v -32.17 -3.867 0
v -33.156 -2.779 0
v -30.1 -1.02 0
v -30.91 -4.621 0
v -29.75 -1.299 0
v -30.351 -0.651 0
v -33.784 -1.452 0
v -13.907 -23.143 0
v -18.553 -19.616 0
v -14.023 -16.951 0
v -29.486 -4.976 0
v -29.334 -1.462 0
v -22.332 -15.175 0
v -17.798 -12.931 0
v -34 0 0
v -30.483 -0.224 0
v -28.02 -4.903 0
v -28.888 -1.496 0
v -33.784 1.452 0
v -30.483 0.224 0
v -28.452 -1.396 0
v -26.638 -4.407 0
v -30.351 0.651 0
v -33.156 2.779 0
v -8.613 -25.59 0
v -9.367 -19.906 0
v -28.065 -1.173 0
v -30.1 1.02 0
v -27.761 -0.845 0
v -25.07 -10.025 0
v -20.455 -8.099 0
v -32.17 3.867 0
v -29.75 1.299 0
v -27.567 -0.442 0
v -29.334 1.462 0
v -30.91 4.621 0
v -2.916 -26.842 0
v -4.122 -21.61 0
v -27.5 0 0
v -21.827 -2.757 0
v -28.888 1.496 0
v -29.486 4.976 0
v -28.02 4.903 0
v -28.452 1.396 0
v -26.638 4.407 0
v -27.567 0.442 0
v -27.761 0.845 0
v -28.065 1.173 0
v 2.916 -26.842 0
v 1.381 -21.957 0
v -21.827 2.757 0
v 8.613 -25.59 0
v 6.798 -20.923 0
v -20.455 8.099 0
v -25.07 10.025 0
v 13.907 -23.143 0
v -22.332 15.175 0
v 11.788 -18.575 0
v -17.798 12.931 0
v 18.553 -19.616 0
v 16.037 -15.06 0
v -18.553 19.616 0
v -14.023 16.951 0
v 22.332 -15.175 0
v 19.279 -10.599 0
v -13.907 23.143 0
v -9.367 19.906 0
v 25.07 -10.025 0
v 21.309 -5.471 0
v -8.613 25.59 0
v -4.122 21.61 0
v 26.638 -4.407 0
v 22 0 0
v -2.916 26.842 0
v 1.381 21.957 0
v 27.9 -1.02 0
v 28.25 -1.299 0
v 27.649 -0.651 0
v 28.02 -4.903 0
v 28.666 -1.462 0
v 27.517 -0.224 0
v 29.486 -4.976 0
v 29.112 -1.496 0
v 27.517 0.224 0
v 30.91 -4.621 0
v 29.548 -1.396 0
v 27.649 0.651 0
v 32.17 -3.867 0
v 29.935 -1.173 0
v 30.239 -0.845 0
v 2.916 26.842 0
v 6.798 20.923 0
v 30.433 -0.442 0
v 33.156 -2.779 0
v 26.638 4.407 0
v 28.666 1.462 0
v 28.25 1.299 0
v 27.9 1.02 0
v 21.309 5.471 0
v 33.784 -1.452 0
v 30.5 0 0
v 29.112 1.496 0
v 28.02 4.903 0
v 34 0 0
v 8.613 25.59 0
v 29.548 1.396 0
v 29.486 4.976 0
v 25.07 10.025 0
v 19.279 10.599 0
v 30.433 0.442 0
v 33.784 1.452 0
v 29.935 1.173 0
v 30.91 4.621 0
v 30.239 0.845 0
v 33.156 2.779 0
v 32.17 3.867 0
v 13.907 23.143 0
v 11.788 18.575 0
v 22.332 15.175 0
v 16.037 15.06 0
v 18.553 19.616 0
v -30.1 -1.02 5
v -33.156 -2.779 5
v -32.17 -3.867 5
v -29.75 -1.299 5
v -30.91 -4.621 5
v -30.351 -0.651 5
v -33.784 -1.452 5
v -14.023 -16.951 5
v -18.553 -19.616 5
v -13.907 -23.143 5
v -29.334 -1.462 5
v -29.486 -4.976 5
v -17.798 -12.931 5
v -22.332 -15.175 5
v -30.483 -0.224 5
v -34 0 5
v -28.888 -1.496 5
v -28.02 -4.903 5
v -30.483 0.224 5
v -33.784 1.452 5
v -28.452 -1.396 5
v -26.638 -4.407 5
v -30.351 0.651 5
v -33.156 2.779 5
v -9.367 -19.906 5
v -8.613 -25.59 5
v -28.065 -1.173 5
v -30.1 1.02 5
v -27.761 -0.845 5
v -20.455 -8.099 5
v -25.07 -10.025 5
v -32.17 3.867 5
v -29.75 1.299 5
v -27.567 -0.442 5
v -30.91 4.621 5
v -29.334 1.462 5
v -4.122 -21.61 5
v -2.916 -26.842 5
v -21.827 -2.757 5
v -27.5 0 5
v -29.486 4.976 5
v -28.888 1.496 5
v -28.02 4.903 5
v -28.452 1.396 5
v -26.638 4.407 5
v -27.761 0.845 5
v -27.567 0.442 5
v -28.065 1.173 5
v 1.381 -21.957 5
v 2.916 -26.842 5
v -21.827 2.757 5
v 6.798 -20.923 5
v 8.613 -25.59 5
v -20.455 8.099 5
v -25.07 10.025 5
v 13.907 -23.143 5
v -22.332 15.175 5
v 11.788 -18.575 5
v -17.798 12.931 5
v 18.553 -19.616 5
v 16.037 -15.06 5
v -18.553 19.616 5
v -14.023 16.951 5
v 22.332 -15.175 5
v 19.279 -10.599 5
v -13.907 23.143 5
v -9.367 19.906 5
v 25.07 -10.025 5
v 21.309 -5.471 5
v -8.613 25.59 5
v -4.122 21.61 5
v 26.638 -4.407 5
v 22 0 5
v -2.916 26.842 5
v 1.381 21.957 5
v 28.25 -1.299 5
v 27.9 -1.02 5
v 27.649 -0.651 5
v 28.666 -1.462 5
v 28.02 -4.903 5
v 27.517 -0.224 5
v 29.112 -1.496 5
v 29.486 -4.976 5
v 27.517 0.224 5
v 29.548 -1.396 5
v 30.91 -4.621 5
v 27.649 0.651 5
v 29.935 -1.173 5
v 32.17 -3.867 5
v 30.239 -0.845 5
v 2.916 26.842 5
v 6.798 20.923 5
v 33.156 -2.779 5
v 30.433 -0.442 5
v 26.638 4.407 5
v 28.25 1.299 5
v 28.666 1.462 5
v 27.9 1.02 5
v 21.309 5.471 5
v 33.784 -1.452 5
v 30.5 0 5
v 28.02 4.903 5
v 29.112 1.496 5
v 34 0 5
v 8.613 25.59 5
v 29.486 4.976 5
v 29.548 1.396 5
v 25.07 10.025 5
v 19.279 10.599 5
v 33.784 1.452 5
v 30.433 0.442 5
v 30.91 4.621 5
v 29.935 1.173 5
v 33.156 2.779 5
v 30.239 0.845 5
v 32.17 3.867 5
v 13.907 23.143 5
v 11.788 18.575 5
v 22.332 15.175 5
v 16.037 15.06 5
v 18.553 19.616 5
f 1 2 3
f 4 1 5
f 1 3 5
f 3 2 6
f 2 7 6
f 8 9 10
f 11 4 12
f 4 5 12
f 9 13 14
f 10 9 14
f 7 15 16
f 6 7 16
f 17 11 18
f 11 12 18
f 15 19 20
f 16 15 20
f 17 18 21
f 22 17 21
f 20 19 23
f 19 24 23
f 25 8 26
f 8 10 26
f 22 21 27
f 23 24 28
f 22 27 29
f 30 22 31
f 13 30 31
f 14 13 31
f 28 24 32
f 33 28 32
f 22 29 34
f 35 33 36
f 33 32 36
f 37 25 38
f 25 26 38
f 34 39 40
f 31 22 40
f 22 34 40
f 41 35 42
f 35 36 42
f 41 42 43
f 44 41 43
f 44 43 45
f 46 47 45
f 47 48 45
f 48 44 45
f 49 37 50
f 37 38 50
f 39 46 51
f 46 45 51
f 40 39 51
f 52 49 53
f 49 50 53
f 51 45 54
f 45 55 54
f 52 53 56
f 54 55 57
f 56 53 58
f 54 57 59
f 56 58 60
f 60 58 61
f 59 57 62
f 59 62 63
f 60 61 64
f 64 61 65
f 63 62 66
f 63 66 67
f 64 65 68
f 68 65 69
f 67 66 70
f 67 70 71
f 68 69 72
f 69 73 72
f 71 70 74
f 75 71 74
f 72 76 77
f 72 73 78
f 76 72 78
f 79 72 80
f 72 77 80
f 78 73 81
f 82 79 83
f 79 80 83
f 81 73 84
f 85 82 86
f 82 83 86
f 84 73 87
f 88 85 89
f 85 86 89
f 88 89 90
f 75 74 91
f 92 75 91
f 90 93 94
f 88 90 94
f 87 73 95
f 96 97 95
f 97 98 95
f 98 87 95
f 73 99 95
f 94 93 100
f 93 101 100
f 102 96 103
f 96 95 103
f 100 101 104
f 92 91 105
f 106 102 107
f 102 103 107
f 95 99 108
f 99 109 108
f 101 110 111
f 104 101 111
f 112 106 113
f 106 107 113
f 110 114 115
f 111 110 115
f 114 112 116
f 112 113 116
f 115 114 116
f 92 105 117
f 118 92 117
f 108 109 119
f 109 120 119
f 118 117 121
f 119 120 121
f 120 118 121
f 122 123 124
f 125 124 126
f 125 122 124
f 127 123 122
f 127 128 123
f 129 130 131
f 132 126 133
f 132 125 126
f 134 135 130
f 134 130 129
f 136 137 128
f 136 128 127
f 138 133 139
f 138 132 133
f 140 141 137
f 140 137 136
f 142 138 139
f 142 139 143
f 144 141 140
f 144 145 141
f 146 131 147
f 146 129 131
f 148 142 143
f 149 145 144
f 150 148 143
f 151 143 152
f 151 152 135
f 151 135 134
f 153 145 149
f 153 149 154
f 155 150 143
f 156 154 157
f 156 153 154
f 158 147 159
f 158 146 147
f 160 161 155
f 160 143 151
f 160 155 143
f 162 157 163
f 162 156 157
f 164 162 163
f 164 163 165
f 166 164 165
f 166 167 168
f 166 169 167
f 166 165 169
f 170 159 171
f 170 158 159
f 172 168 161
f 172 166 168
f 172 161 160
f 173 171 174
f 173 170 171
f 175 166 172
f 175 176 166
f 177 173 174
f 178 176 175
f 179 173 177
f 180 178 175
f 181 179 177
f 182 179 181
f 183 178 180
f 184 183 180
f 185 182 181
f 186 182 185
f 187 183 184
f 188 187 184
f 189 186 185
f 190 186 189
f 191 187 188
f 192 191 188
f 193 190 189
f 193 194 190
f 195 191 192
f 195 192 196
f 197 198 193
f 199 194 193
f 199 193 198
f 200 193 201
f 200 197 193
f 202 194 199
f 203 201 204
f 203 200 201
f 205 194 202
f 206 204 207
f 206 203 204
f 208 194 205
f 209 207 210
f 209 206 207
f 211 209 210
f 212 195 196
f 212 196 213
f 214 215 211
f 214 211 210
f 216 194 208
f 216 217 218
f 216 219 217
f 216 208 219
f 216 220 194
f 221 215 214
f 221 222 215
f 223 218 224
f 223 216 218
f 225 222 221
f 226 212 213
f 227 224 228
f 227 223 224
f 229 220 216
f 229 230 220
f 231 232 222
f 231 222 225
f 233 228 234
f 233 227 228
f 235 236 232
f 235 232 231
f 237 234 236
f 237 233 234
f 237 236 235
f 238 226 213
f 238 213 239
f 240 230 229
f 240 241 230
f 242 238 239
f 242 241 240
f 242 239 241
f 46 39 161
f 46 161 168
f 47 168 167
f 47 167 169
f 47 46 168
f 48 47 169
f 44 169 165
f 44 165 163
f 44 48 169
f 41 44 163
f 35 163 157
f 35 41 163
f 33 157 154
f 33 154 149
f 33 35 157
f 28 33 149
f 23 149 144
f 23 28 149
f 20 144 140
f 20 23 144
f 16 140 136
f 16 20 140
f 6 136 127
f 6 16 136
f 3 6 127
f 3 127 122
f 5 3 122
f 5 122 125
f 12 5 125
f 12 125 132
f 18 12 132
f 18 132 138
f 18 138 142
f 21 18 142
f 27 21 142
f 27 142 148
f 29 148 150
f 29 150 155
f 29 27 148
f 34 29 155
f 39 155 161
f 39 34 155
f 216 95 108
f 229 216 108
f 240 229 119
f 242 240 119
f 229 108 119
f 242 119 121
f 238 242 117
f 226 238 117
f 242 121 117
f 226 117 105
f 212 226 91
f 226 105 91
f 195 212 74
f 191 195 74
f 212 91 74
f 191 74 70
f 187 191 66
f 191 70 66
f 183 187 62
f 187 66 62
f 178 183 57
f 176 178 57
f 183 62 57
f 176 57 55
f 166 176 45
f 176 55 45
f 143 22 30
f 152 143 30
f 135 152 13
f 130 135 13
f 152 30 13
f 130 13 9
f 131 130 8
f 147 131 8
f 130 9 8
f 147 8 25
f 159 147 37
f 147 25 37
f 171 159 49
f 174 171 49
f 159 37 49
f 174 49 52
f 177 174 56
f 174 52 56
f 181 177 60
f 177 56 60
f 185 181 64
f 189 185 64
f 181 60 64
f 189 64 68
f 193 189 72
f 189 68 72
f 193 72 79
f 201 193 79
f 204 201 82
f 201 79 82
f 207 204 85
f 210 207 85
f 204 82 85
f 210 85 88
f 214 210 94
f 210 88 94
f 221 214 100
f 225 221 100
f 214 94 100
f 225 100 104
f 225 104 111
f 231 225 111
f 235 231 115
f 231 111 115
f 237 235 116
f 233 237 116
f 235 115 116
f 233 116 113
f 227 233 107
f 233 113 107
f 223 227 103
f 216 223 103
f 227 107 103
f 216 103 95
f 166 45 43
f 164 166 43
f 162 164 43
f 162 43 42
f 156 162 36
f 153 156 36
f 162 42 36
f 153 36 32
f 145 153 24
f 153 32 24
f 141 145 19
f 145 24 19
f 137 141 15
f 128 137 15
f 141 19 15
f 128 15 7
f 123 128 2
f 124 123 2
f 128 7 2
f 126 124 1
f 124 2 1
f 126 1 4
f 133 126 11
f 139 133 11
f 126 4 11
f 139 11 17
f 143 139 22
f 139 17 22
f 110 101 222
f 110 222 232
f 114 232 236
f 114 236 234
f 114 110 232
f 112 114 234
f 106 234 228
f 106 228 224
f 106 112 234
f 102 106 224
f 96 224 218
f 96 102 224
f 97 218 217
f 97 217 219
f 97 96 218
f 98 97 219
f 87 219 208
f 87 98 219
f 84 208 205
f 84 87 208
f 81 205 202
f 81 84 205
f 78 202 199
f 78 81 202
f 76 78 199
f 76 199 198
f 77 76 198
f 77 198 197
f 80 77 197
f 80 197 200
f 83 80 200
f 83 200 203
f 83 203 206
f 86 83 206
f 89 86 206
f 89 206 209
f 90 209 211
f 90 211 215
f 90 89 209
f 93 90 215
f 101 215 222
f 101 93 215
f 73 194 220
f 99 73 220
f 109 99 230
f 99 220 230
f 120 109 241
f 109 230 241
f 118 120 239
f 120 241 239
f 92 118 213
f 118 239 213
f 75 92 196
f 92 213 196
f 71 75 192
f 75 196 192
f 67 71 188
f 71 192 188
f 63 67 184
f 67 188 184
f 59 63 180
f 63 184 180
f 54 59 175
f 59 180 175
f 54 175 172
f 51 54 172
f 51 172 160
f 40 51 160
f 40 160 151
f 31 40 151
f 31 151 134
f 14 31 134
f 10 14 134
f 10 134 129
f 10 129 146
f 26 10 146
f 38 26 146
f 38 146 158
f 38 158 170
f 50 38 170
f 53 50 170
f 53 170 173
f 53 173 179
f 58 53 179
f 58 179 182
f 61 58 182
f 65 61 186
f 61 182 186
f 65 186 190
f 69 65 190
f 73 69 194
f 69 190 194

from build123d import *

# Parameters (mm, degrees)
F0_R     = 1.5
F1_DEPTH = 5
F2_DEPTH = 5
F3_R     = 22
F4_DEPTH = 6


with BuildPart() as f1:
    # F0 (on Top) → F1 (new body)
    with BuildSketch(Plane.XY):
        with BuildLine():
            ThreePointArc((-26.6379310345, -4.4068844099), (-27, 0), (-26.6379310345, 4.4068844099))
            ThreePointArc((-26.6379310345, 4.4068844099), (-34, 0), (-26.6379310345, -4.4068844099))
        make_face()
        with Locations((-29, 0)):
            Circle(F0_R, mode=Mode.SUBTRACT)
    extrude(amount=F1_DEPTH)



with BuildPart() as f1b:
    # F0 (on Top) → F1, piece 2 (new body)
    with BuildSketch(Plane.XY):
        with BuildLine():
            ThreePointArc((26.6379310345, 4.4068844099), (26.9093305187, 2.21086658), (27, 0))
            ThreePointArc((27, 0), (26.9093305187, -2.21086658), (26.6379310345, -4.4068844099))
            ThreePointArc((26.6379310345, -4.4068844099), (31.5680396388, -4.2901249881), (34, 0))
            ThreePointArc((34, 0), (31.5680396388, 4.2901249881), (26.6379310345, 4.4068844099))
        make_face()
        with Locations((29, 0)):
            Circle(F0_R, mode=Mode.SUBTRACT)
    extrude(amount=F1_DEPTH)


with BuildPart() as f1_1:
    add(f1.part)

    add(f1b.part)  # F2 merges F1b
    # F0 (on Top) → F2 (join)
    with BuildSketch(Plane.XY):
        with BuildLine():
            ThreePointArc((-24, 0), (-24.7098750119, 2.5680396388), (-26.6379310345, 4.4068844099))
            ThreePointArc((-26.6379310345, 4.4068844099), (-27, 0), (-26.6379310345, -4.4068844099))
            ThreePointArc((-26.6379310345, -4.4068844099), (-24.7098750119, -2.5680396388), (-24, 0))
        make_face()
        with BuildLine():
            ThreePointArc((26.6379310345, -4.4068844099), (26.9093305187, -2.21086658), (27, 0))
            ThreePointArc((27, 0), (26.9093305187, 2.21086658), (26.6379310345, 4.4068844099))
            ThreePointArc((26.6379310345, 4.4068844099), (24, 0), (26.6379310345, -4.4068844099))
        make_face()
        with BuildLine():
            ThreePointArc((26.6379310345, -4.4068844099), (24, 0), (26.6379310345, 4.4068844099))
            ThreePointArc((26.6379310345, 4.4068844099), (0, 27), (-26.6379310345, 4.4068844099))
            ThreePointArc((-26.6379310345, 4.4068844099), (-24.7098750119, 2.5680396388), (-24, 0))
            ThreePointArc((-24, 0), (-24.7098750119, -2.5680396388), (-26.6379310345, -4.4068844099))
            ThreePointArc((-26.6379310345, -4.4068844099), (0, -27), (26.6379310345, -4.4068844099))
        make_face()
    extrude(amount=F2_DEPTH)

    # F3 (on face) → F4 (cut)
    with BuildSketch(Plane.XY.offset(5)):
        Circle(F3_R)
    extrude(amount=-F4_DEPTH, mode=Mode.SUBTRACT)


solid = f1_1.part
